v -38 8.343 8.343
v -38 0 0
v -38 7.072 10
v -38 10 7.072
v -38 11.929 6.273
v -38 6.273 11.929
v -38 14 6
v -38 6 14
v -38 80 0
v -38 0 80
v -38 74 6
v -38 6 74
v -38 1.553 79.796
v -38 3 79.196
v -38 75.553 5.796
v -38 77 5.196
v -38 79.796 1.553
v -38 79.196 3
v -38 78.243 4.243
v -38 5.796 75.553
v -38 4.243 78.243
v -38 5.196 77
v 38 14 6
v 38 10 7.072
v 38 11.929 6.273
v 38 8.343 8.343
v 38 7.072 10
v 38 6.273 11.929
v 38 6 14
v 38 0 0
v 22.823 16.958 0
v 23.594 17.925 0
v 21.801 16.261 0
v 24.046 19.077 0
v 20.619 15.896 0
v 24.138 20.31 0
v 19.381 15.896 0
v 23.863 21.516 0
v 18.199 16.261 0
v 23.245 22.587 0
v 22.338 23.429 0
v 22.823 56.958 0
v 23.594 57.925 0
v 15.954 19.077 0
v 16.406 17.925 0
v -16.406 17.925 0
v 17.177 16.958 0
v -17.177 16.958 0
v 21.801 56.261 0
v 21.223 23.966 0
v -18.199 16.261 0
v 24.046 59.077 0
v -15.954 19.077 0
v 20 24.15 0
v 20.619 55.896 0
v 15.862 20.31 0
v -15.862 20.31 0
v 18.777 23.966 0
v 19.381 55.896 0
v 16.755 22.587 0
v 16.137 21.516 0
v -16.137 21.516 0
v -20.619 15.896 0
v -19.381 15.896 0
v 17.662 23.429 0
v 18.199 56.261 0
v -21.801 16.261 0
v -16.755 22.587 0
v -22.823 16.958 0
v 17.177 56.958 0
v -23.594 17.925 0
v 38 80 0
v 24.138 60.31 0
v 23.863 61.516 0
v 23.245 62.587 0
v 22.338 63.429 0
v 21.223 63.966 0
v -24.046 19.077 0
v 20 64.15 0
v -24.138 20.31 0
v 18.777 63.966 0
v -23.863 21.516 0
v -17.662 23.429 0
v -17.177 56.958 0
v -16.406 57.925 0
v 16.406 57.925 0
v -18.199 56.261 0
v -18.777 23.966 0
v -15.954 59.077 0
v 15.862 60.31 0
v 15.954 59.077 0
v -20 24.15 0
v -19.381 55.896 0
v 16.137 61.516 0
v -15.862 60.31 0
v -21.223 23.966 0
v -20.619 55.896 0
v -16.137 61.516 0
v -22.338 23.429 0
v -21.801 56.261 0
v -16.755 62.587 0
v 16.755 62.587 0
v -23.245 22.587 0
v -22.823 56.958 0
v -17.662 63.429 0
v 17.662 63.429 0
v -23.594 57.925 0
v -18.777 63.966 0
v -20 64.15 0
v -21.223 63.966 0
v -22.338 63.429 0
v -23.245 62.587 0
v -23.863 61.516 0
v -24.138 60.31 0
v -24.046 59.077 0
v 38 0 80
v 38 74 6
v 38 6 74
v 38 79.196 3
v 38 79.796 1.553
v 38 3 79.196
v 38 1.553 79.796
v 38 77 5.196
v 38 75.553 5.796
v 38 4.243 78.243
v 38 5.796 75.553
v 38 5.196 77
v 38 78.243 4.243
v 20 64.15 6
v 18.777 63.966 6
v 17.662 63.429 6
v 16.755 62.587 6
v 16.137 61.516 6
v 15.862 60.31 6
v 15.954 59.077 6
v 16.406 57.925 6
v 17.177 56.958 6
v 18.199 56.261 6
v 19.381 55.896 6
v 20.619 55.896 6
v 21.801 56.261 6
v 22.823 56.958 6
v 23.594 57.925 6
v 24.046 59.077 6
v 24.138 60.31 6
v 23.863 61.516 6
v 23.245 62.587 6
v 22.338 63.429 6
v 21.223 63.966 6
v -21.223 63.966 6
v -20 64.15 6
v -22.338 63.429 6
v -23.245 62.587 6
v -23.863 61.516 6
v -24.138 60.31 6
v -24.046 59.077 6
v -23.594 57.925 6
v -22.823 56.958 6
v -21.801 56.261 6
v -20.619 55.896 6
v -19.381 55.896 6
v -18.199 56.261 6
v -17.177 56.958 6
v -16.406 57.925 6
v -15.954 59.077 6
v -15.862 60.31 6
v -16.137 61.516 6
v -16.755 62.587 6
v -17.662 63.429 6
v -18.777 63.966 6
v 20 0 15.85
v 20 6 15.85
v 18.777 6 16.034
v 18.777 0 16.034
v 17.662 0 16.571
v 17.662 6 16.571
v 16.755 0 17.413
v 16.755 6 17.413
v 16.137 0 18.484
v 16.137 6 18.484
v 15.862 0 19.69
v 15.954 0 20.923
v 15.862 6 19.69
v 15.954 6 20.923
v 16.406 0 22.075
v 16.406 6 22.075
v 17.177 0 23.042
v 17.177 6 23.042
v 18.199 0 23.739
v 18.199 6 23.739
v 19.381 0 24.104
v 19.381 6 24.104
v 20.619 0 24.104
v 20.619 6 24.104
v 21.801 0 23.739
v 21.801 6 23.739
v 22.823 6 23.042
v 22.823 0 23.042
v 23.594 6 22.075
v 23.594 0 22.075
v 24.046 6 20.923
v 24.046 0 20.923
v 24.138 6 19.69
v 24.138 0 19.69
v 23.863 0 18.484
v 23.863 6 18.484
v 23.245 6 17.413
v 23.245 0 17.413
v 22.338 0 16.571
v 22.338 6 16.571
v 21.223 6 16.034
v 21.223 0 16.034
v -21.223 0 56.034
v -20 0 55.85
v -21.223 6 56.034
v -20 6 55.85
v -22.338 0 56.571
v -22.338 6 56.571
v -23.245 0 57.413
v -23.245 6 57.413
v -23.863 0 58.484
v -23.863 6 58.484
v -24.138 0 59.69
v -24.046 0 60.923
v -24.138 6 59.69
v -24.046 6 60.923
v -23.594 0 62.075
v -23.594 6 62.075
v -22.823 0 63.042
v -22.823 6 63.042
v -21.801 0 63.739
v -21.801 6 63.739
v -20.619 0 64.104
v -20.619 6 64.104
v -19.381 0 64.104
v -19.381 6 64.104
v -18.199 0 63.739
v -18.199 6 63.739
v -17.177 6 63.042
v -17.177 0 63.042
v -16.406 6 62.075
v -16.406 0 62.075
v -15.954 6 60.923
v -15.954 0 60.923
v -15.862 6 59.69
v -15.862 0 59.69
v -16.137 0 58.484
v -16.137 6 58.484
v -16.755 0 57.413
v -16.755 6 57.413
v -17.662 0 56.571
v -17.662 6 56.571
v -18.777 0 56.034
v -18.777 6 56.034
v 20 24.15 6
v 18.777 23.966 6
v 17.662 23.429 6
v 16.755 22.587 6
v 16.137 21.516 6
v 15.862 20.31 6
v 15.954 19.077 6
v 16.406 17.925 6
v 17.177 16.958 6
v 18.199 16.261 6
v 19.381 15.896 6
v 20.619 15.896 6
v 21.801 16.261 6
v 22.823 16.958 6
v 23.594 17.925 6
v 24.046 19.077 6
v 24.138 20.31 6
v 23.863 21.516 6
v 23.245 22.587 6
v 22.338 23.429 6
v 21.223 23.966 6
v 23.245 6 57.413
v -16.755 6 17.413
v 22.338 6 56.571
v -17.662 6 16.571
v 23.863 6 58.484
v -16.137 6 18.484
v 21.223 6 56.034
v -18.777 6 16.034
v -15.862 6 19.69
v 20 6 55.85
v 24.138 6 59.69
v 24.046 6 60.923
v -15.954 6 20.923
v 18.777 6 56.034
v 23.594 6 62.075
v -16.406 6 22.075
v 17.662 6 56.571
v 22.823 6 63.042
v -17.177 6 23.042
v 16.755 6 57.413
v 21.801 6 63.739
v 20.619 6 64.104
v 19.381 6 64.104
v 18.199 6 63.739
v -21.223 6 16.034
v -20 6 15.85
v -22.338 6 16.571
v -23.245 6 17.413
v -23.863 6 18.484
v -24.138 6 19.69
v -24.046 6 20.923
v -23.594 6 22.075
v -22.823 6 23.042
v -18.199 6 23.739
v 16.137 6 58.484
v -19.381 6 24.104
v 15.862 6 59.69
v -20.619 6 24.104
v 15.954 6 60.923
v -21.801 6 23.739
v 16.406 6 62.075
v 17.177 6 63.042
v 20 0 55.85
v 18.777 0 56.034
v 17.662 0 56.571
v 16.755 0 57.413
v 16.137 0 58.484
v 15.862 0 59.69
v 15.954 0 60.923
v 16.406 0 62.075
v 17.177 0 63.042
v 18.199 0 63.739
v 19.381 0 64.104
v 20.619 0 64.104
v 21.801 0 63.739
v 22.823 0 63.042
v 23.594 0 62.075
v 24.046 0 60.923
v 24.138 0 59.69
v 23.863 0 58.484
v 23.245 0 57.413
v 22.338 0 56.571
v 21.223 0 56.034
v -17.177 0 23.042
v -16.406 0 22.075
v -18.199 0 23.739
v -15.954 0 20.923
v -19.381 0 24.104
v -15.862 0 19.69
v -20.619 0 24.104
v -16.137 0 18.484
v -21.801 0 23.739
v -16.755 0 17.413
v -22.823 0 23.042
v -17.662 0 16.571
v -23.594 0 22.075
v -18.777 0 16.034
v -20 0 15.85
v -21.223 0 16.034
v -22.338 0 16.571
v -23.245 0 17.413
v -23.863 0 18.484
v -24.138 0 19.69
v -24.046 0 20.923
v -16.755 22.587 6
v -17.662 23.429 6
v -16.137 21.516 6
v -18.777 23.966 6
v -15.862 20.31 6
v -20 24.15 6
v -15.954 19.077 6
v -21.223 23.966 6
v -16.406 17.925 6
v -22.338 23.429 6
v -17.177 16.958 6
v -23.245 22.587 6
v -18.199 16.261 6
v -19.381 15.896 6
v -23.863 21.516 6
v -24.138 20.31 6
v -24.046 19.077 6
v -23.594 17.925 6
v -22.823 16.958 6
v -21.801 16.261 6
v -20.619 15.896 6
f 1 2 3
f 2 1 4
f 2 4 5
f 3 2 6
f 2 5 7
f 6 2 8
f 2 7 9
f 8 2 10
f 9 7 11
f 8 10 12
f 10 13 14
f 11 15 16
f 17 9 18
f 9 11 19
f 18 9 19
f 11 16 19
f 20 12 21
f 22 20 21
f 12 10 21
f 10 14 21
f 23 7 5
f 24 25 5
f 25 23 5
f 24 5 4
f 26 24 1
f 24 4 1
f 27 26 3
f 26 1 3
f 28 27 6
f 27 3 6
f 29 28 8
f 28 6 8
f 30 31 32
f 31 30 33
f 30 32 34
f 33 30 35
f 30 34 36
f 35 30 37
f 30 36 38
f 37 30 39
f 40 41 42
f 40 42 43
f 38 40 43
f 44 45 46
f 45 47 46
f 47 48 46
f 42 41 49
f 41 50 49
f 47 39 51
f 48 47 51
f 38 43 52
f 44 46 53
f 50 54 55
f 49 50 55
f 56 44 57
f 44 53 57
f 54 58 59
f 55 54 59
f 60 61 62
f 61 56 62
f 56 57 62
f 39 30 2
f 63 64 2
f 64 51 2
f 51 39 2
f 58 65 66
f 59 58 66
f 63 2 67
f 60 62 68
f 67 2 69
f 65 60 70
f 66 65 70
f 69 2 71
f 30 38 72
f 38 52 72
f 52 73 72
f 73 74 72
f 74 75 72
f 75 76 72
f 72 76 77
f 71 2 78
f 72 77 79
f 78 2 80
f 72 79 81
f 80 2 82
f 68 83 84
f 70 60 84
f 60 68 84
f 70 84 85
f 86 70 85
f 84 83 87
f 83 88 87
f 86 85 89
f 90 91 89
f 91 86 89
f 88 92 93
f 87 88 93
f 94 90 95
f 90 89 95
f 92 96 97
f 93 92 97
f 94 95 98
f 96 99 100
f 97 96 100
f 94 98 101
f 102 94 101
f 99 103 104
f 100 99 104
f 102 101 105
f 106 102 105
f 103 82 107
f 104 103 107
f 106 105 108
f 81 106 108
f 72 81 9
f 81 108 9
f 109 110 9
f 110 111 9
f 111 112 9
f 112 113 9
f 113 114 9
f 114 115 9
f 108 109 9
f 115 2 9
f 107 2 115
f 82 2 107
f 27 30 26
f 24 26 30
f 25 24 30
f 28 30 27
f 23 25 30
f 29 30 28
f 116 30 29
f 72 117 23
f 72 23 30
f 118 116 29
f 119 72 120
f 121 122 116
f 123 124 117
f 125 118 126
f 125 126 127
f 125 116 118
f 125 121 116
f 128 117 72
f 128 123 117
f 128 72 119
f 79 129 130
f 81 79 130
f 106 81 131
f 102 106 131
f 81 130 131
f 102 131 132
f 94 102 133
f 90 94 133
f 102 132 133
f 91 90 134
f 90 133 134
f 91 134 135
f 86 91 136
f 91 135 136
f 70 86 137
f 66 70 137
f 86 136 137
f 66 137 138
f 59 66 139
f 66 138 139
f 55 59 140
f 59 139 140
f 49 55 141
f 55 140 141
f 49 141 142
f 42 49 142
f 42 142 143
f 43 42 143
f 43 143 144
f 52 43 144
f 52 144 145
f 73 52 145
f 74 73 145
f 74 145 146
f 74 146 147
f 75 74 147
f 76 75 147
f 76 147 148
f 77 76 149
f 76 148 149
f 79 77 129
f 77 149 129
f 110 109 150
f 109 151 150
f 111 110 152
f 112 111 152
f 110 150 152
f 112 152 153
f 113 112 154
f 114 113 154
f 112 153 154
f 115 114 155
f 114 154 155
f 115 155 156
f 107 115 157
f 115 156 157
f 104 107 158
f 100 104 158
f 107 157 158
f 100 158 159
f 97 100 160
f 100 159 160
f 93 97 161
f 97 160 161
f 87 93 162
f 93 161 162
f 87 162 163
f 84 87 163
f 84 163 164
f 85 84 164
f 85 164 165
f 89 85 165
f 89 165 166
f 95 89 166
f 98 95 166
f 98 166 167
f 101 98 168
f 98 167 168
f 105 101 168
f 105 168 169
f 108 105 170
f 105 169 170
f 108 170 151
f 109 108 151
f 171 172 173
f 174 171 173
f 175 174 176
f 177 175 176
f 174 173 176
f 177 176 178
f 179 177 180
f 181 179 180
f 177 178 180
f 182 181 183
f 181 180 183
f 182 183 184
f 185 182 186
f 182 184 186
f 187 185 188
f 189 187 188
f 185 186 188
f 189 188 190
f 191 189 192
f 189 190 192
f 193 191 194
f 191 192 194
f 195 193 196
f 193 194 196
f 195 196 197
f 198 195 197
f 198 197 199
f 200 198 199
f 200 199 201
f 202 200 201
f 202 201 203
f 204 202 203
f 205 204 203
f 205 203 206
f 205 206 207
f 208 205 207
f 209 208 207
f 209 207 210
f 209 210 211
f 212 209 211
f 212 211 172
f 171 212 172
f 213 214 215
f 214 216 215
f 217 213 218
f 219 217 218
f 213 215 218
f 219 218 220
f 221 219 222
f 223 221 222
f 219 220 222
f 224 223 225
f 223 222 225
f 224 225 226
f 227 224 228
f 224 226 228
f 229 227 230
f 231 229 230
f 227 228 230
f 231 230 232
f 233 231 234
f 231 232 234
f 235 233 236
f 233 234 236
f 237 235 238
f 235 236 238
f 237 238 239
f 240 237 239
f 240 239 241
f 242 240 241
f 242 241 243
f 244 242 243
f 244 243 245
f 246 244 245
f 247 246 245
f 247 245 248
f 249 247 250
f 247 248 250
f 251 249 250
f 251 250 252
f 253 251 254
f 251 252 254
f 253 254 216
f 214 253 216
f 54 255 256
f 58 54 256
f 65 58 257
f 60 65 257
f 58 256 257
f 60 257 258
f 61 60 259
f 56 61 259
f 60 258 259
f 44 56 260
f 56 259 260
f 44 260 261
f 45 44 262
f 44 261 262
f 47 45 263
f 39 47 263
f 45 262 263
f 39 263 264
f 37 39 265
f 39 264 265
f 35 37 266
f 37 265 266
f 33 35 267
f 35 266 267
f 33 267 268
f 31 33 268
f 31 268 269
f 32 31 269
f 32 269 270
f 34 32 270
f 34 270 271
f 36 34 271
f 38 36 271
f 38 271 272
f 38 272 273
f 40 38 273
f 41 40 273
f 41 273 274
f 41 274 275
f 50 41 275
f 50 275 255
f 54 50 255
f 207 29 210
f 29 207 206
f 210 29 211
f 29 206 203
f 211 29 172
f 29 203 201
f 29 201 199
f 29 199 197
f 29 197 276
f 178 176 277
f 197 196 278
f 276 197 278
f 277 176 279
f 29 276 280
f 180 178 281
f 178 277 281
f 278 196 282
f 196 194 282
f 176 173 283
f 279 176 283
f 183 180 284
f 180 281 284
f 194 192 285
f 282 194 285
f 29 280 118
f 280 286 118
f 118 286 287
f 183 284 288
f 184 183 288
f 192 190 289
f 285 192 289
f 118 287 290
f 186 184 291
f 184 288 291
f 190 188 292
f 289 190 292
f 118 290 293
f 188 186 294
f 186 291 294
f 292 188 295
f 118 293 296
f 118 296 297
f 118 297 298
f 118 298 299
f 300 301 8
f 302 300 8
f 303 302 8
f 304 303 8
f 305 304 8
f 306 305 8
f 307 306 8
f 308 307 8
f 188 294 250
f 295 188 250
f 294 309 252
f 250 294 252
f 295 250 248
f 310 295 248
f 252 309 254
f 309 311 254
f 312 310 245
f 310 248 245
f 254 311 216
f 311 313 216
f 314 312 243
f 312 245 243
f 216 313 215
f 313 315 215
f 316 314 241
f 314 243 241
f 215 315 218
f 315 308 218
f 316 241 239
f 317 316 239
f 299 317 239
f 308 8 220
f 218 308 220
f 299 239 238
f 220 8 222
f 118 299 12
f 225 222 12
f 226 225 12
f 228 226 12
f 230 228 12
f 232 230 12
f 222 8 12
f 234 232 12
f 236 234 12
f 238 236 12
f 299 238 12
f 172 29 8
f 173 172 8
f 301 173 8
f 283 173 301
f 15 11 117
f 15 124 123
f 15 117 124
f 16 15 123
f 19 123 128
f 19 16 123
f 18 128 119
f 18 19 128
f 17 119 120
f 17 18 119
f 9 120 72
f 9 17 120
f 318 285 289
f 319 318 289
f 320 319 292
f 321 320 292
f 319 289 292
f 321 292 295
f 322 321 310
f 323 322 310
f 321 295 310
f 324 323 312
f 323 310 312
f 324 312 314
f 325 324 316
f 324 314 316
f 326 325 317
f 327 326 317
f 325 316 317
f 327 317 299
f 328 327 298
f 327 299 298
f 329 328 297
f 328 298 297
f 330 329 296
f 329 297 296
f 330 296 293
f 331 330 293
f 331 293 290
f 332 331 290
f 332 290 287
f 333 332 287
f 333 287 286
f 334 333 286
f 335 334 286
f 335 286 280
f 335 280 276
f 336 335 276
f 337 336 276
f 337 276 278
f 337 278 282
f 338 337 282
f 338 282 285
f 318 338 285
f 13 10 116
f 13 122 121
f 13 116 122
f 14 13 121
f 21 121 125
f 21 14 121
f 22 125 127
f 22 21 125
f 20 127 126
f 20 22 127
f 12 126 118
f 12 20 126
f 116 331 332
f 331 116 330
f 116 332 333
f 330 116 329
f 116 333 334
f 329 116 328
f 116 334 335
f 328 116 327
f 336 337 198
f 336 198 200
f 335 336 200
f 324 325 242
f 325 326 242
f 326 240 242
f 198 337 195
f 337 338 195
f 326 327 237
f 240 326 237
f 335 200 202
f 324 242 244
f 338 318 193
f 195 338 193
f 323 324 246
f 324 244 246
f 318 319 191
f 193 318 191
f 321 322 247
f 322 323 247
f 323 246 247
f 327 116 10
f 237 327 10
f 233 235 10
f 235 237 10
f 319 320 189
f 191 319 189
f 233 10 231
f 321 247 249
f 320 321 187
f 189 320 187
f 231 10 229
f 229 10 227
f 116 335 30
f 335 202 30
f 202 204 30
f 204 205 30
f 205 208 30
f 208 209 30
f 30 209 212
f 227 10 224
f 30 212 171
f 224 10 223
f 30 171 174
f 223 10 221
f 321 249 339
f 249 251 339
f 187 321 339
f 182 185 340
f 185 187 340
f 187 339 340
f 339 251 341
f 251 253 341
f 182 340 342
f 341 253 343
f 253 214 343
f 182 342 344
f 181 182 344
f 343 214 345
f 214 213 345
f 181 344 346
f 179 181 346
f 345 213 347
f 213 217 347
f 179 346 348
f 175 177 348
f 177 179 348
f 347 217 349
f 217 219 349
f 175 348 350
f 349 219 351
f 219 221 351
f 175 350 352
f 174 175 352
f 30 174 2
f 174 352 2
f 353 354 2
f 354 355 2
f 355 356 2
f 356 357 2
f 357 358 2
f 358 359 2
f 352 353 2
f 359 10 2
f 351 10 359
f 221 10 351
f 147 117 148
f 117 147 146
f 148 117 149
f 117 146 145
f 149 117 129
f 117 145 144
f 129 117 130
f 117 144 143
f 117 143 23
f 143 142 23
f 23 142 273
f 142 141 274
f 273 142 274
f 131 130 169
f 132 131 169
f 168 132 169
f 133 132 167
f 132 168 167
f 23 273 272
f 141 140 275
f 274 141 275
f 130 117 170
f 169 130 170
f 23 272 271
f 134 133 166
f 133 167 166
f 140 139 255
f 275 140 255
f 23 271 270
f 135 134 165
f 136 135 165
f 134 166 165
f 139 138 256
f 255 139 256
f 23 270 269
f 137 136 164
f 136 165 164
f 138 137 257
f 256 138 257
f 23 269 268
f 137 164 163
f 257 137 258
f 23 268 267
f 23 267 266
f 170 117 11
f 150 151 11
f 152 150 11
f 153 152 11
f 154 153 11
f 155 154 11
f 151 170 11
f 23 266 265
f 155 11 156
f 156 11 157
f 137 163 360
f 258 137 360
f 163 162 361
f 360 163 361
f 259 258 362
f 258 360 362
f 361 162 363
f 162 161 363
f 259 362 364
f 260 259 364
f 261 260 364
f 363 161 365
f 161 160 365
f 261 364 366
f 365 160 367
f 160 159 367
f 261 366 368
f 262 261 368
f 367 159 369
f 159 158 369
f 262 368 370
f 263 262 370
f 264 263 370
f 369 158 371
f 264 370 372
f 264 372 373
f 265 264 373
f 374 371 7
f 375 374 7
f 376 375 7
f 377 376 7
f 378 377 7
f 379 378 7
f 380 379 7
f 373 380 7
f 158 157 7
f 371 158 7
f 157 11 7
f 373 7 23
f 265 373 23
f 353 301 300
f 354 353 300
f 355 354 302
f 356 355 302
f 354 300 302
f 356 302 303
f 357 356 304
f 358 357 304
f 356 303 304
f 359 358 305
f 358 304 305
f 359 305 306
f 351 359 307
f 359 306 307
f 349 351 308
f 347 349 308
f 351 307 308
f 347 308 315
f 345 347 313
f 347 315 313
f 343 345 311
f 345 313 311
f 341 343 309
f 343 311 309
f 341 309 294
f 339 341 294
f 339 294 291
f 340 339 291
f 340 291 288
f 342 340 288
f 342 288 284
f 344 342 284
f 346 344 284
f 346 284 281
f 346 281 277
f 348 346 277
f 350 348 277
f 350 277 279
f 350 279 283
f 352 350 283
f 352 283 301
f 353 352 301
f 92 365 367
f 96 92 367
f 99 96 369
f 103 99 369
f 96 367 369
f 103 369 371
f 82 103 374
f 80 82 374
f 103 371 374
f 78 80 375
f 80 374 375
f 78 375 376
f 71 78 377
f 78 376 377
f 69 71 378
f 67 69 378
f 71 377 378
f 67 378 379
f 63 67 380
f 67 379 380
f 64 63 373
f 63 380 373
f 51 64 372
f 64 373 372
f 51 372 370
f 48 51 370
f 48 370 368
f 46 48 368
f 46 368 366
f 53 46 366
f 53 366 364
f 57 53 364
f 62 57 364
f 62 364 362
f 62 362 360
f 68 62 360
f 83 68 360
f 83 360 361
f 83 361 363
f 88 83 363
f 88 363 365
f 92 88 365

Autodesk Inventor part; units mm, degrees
ref_plane "YZ Plane" through (0, 0, 0) normal (1, 0, 0) x (0, 1, 0)
ref_plane "XZ Plane" through (0, 0, 0) normal (0, 1, 0) x (-1, 0, 0)
ref_plane "XY Plane" through (0, 0, 0) normal (0, 0, 1) x (1, 0, 0)
sketch "Sketch_1" plane through (0, 0, 0) normal (1, 0, 0) x (0, 1, 0)
  line L0 (0, 80) -> (0, 0)
  line L1 (0, 0) -> (80, 0)
  arc A0 (80, 0) -> (74, 6) centre (74, 0) ccw
  line L2 (74, 6) -> (14, 6)
  arc A1 (6, 14) -> (14, 6) centre (14, 14) ccw
  line L3 (6, 14) -> (6, 74)
  arc A2 (6, 74) -> (0, 80) centre (0, 74) ccw
extrude "Extrusion1" add sketch "Sketch_1" along normal mid plane 76
sketch "Sketch2" plane through (38, 80, 0) normal (0, 0, -1) x (-1, 0, 0)
  point P0 (18, -20)
hole "Hole1" at (20, 60, 0) direction (0, 0, 1) diameter 8.3 depth 6.6
sketch "Sketch3" plane through (38, 80, 0) normal (0, 0, -1) x (-1, 0, 0)
  point P0 (58, -60)
hole "Hole2" at (-20, 20, 0) direction (0, 0, 1) diameter 8.3 depth 6.6
sketch "Sketch4" plane through (38, 80, 0) normal (0, 0, -1) x (-1, 0, 0)
  point P0 (58, -20)
hole "Hole3" at (-20, 60, 0) direction (0, 0, 1) diameter 8.3 depth 6.6
sketch "Sketch5" plane through (-38, 0, 0) normal (0, -1, 0) x (1, 0, 0)
  point P0 (58, 20)
hole "Hole4" at (20, 0, 20) direction (0, 1, 0) diameter 8.3 depth 6.6
sketch "Sketch6" plane through (-38, 0, 0) normal (0, -1, 0) x (1, 0, 0)
  point P0 (58, 60)
hole "Hole5" at (20, 0, 60) direction (0, 1, 0) diameter 8.3 depth 6.6
sketch "Sketch7" plane through (-38, 0, 0) normal (0, -1, 0) x (1, 0, 0)
  point P0 (18, 20)
hole "Hole6" at (-20, 0, 20) direction (0, 1, 0) diameter 8.3 depth 6.6
sketch "Sketch8" plane through (-38, 0, 0) normal (0, -1, 0) x (1, 0, 0)
  point P0 (18, 60)
hole "Hole7" at (-20, 0, 60) direction (0, 1, 0) diameter 8.3 depth 6.6
sketch "Sketch9" plane through (38, 80, 0) normal (0, 0, -1) x (-1, 0, 0)
  point P0 (18, -60)
hole "Hole8" at (20, 20, 0) direction (0, 0, 1) diameter 8.3 depth 6.6
properties part number "40-4304 Aluminum"
